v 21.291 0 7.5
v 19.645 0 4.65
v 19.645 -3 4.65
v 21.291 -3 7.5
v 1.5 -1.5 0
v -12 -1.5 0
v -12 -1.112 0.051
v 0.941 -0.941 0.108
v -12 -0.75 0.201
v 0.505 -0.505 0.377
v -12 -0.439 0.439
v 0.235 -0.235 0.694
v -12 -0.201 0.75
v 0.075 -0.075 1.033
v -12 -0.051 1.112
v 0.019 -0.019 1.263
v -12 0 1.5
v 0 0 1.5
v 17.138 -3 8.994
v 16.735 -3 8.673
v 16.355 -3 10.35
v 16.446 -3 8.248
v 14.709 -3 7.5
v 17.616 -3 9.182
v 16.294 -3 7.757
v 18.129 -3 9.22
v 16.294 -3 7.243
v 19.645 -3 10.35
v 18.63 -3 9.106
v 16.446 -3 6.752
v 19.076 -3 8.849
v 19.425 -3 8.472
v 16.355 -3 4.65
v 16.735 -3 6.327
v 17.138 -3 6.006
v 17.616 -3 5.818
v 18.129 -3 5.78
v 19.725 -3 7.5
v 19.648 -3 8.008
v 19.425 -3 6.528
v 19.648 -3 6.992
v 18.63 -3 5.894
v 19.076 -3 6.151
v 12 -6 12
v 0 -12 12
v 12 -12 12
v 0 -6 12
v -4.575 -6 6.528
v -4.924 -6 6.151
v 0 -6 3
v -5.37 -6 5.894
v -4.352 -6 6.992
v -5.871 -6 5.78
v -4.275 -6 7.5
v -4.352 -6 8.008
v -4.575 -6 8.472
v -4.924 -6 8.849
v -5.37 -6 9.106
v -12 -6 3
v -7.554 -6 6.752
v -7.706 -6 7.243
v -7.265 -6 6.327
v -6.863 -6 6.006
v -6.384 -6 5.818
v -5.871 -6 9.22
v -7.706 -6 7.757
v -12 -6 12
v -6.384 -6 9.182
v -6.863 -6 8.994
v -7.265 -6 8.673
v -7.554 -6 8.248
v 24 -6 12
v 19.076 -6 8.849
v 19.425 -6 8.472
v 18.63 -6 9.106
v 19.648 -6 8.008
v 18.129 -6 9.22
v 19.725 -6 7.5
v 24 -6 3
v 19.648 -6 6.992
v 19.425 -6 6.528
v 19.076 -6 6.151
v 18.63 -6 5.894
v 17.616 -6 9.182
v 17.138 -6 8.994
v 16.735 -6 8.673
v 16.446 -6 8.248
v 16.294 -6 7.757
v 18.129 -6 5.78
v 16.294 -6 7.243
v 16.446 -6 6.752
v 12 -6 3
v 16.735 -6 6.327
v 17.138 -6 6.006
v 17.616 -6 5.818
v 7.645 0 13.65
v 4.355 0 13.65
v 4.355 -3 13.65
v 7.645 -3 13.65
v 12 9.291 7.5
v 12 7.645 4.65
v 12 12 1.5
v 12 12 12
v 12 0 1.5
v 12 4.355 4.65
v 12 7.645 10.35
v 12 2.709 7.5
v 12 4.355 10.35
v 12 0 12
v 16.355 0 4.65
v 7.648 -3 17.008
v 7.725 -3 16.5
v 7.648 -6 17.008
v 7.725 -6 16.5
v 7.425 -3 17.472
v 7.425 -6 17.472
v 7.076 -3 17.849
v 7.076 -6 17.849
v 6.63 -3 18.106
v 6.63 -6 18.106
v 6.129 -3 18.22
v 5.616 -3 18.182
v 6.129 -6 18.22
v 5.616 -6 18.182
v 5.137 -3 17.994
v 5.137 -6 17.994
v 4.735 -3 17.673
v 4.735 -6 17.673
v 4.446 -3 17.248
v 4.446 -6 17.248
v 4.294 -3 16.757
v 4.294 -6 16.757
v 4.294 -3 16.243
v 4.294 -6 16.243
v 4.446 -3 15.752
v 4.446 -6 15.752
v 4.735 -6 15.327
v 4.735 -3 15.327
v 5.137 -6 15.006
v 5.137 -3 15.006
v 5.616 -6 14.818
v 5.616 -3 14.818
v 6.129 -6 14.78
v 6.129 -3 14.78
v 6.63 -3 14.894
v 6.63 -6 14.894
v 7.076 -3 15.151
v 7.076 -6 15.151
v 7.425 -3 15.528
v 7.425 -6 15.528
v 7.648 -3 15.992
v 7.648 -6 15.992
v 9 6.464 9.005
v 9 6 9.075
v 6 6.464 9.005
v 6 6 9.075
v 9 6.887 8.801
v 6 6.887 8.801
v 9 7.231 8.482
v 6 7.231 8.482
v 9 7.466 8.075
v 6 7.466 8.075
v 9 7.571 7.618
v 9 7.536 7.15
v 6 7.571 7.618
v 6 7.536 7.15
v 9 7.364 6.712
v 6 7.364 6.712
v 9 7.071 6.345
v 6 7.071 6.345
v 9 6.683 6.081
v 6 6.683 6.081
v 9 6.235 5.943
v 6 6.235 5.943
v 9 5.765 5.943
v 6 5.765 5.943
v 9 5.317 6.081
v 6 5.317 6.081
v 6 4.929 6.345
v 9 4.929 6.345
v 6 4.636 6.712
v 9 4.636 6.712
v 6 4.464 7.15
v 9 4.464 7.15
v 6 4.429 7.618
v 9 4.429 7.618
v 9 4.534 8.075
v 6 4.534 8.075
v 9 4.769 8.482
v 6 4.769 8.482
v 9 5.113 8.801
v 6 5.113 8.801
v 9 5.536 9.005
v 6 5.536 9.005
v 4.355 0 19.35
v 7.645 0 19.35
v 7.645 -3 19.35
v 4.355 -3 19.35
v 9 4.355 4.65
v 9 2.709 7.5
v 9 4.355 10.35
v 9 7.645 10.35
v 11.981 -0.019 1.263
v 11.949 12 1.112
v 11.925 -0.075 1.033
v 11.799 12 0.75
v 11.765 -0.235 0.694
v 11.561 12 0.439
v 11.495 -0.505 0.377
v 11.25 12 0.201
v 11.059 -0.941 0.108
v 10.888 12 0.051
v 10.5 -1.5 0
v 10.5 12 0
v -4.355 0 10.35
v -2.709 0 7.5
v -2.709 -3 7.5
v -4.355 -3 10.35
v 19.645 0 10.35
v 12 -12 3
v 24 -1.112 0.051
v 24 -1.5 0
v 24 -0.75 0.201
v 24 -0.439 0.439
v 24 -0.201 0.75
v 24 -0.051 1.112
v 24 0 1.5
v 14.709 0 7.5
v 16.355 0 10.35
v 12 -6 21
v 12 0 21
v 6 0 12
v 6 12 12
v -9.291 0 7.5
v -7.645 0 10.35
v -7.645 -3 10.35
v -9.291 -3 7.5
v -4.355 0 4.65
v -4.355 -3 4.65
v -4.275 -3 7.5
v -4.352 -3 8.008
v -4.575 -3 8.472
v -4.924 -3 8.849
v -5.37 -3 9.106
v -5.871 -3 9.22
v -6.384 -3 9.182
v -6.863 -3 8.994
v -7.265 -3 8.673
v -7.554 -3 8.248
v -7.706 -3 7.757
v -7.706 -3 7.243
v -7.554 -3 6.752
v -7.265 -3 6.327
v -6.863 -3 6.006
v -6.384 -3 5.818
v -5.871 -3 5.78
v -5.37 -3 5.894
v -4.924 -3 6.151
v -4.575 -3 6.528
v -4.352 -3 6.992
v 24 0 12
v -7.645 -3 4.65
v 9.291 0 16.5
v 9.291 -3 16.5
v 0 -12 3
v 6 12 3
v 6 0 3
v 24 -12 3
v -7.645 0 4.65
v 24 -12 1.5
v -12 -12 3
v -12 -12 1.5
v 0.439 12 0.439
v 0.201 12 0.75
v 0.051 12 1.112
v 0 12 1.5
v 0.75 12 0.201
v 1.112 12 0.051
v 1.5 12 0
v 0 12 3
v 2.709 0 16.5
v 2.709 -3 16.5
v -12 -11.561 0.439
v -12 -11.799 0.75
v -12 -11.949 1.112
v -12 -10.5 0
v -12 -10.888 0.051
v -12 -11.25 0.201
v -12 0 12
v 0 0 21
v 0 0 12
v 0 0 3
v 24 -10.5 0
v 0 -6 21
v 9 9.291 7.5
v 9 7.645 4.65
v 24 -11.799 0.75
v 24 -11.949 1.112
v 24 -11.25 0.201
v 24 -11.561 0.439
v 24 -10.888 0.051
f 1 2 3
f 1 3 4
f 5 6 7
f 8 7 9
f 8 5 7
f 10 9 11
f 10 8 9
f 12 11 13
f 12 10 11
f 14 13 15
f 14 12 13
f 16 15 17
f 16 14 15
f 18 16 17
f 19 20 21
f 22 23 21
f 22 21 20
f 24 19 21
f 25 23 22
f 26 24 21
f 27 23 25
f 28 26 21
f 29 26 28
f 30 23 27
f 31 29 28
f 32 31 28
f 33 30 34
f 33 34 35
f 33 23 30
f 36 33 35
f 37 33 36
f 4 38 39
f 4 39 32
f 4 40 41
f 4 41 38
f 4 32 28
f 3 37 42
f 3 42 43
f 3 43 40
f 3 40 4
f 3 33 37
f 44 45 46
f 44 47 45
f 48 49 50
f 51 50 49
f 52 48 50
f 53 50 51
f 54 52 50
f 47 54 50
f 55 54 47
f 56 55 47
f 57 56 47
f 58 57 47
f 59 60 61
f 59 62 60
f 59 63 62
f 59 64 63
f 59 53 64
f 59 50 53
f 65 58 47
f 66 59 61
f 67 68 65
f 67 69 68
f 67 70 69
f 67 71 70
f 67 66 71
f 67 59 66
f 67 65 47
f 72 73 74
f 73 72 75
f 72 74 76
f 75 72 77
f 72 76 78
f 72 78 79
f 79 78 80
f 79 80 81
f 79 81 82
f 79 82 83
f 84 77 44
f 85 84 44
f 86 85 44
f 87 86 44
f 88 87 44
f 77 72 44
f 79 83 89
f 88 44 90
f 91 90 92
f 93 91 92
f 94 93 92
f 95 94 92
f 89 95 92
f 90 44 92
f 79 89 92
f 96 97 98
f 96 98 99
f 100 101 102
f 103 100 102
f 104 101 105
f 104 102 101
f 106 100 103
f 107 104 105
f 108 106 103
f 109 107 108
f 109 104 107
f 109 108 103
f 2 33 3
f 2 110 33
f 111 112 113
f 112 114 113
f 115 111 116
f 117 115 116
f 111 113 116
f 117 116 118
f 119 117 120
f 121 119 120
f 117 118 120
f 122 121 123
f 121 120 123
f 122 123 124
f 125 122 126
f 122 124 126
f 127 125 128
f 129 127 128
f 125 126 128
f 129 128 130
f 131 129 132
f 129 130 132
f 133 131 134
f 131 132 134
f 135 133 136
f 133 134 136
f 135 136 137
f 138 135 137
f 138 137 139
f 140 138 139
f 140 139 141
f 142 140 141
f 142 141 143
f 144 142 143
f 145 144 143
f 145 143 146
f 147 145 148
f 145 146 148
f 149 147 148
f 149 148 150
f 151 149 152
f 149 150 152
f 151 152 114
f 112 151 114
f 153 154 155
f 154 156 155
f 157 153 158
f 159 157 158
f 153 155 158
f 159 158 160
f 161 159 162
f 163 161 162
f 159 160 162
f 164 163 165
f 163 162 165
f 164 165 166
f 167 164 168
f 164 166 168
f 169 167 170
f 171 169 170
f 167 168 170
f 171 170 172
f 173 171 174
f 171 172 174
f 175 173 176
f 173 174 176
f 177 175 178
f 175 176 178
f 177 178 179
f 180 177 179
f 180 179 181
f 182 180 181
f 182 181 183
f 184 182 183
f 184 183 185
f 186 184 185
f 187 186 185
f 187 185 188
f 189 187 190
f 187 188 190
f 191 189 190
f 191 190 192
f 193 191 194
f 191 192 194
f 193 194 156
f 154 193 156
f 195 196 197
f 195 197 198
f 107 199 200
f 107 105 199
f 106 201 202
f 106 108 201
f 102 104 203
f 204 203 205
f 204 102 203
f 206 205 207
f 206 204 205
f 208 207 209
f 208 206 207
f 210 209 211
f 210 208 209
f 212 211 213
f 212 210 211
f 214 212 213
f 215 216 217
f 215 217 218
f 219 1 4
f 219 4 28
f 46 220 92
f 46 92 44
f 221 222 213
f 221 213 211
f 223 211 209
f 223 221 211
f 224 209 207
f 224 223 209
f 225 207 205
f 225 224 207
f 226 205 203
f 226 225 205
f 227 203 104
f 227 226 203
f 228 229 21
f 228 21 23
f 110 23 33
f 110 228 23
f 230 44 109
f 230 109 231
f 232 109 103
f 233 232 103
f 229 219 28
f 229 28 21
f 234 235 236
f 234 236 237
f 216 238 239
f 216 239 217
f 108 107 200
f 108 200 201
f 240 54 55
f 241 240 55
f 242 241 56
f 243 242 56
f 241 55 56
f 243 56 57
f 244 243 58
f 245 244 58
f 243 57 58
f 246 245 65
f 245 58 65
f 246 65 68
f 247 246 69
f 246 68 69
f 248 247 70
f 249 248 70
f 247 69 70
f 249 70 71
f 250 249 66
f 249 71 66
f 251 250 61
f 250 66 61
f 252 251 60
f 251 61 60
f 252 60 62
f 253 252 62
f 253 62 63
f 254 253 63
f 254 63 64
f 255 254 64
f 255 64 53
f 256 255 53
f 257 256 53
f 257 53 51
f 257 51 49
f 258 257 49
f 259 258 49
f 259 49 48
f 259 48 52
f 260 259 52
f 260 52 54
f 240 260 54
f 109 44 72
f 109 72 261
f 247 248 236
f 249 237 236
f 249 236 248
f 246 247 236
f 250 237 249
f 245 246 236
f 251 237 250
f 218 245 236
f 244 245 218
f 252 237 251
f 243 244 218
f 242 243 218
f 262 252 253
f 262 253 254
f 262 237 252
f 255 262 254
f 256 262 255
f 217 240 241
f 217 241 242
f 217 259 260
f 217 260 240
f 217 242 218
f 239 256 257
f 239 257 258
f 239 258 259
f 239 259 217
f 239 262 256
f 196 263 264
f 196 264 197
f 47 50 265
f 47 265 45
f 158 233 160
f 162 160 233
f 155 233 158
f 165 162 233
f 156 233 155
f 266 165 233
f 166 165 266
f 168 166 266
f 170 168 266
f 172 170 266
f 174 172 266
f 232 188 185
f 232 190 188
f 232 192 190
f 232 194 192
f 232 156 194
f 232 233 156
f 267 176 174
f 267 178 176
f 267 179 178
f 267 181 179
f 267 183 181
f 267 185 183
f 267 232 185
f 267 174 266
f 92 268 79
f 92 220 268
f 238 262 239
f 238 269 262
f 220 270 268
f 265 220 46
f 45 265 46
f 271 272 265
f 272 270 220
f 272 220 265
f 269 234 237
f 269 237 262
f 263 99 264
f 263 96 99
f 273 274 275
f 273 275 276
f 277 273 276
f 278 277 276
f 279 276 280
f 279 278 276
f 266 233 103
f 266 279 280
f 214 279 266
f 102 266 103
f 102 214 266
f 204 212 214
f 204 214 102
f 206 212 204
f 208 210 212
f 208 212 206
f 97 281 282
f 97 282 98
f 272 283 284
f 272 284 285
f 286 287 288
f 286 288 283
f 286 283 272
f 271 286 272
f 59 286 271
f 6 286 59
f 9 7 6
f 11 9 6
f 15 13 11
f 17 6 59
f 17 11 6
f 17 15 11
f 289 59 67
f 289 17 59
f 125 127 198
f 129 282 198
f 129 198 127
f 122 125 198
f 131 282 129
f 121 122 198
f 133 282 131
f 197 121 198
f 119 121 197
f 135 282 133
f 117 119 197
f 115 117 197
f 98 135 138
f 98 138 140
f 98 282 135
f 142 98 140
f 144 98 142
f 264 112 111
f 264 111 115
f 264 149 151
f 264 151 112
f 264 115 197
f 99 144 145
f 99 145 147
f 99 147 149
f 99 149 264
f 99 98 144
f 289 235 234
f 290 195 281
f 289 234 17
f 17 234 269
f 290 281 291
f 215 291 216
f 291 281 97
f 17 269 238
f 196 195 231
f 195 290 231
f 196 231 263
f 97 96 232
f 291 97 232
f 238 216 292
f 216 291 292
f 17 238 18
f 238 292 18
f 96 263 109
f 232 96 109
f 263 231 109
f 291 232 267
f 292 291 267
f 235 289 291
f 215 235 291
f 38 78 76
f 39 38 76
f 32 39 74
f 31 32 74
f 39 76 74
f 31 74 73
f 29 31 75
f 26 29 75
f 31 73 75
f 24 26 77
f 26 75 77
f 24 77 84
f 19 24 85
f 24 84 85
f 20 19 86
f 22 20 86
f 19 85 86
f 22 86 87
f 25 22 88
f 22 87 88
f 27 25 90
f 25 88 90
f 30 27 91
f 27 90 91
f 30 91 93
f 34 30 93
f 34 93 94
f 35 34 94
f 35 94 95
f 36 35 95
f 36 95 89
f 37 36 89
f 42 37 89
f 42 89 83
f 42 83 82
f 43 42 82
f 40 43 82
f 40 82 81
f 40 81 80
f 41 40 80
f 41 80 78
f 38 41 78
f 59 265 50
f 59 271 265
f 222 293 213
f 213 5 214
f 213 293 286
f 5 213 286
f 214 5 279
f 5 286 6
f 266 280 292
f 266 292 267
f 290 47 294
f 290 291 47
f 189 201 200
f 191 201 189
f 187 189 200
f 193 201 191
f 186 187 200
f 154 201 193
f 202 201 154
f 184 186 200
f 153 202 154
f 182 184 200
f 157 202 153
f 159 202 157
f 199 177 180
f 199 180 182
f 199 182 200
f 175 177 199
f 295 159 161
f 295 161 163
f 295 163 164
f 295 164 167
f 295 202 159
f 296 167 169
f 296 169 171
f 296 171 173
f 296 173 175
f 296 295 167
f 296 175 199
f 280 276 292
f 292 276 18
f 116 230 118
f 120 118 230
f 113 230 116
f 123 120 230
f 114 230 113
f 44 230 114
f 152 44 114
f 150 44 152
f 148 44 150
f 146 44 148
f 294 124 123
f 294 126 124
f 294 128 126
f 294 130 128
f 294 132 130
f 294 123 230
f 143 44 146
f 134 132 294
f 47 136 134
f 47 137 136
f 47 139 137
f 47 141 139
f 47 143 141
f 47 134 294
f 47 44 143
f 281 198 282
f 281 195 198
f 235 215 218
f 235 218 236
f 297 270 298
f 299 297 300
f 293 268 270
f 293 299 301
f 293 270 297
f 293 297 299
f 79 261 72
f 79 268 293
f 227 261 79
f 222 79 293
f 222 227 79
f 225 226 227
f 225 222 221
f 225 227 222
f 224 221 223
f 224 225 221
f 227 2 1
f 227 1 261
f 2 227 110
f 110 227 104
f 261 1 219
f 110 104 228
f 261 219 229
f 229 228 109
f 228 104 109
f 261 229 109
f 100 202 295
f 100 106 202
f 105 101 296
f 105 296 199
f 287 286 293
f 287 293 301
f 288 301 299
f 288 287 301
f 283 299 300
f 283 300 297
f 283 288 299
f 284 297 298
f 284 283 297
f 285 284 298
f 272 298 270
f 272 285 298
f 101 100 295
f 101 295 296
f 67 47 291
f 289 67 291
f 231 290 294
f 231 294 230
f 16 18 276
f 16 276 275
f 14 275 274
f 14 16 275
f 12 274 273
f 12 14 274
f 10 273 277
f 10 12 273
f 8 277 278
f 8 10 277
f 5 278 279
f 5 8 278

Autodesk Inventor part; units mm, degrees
ref_plane "YZ Plane" through (0, 0, 0) normal (1, 0, 0) x (0, 1, 0)
ref_plane "XZ Plane" through (0, 0, 0) normal (0, 1, 0) x (-1, 0, 0)
ref_plane "XY Plane" through (0, 0, 0) normal (0, 0, 1) x (1, 0, 0)
sketch "Sketch1" plane through (0, 0, 0) normal (0, 0, 1) x (1, 0, 0)
  line L0 (0, 0) -> (12, 0)
  line L1 (12, 0) -> (12, 12)
  line L2 (12, 12) -> (0, 12)
  line L3 (0, 12) -> (0, 0)
  line L4 (12, 0) -> (0, 0)
  line L5 (0, 0) -> (0, -12)
  line L6 (0, -12) -> (12, -12)
  line L7 (12, -12) -> (12, 0)
  line L8 (12, 0) -> (24, 0)
  line L9 (24, 0) -> (24, -12)
  line L10 (24, -12) -> (12, -12)
  line L11 (12, -12) -> (12, 0)
  line L12 (0, -12) -> (-12, -12)
  line L13 (-12, -12) -> (-12, 0)
  line L14 (-12, 0) -> (0, 0)
  line L15 (0, 0) -> (0, -12)
  line L16 (0, -12) -> (12, -12)
  line L17 (12, -12) -> (12, -24)
  line L18 (12, -24) -> (0, -24)
  line L19 (0, -24) -> (0, -12)
  dimension "d0" = 12
  dimension "d1" = 12
  dimension "d2" = 12
  dimension "d3" = 12
  dimension "d4" = 12
  dimension "d5" = 12
  dimension "d6" = 12
  dimension "d7" = 12
  dimension "d8" = 12
  dimension "d9" = 12
extrude "Extrusion1" add sketch "Sketch1" along normal blind 3
sketch "Sketch2" plane through (0, 0, 3) normal (0, 0, 1) x (1, 0, 0)
  line L0 (-12, 0) -> (-12, -12) projected
  line L1 (-12, -12) -> (-12, -6)
  line L2 (-12, -6) -> (0, -6)
  line L3 (-12, -12) -> (0, -12) projected
  line L4 (0, -6) -> (0, -12)
  line L5 (0, -12) -> (-12, -12)
  line L6 (12, -24) -> (12, -12) projected
  line L7 (12, -12) -> (12, -6)
  line L8 (12, -6) -> (24, -6)
  line L9 (24, -12) -> (24, 0) projected
  line L10 (12, -12) -> (24, -12) projected
  line L11 (24, -6) -> (24, -12)
  line L12 (24, -12) -> (12, -12)
  line L13 (0, 0) -> (0, -6)
  line L14 (12, 0) -> (12, 12) projected
  line L15 (0, 0) -> (12, 0)
  line L16 (12, 0) -> (12, -6)
  line L17 (12, -12) -> (0, -12)
  line L18 (0, 12) -> (0, 0) projected
  line L19 (0, 0) -> (0, 12)
  line L20 (0, 12) -> (6, 12)
  line L21 (12, 12) -> (0, 12) projected
  line L22 (6, 12) -> (6, 0)
  line L23 (6, 0) -> (0, 0)
  line L24 (0, -12) -> (0, -24) projected
  line L25 (0, -12) -> (0, -24)
  line L26 (0, -24) -> (6, -24)
  line L27 (0, -24) -> (12, -24) projected
  line L28 (6, -24) -> (6, -12)
  line L29 (6, -12) -> (0, -12)
  dimension "d12" = 6
  dimension "d13" = 12
extrude "Extrusion2" add sketch "Sketch2" along normal blind 9 contours L2 L4 L3 L0 | L13 L15 L16 L7 L17 L4 | L17 L28 L26 L24 | L18 L20 L22 L15 | L7 L8 L9 L10
sketch "Sketch3" plane through (0, 0, 12) normal (0, 0, 1) x (1, 0, 0)
  line L0 (0, -6) -> (12, -6)
  line L1 (12, -12) -> (6, -12) projected
  line L2 (12, -6) -> (12, -12)
  line L3 (0, -12) -> (0, -24) projected
  line L4 (12, -12) -> (0, -12)
  line L5 (0, -12) -> (0, -6)
  point P0 (0, 0)
extrude "Extrusion3" add sketch "Sketch3" along normal blind 9
sketch "Sketch4" plane through (6, -12, 3) normal (0, -1, 0) x (1, 0, 0)
  point P0 (-6, -3)
sketch "Sketch5" plane through (-12, -6, 3) normal (0, 1, 0) x (1, 0, 0)
  circle A0 centre (6, -4.5) radius 1.725
  line L0 (0, 0) -> (0, -9) projected
  line L1 (12, -9) -> (0, -9) projected
  circle A1 centre (18, -13.5) radius 1.725
  line L2 (24, -18) -> (12, -18) projected
  line L3 (24, -9) -> (24, -18) projected
  circle A2 centre (30, -4.5) radius 1.725
  line L4 (36, 0) -> (36, -9) projected
  line L5 (36, -9) -> (24, -9) projected
  point P0 (12, 3)
  dimension "d19" = 3.45
  dimension "d20" = 6
  dimension "d21" = 4.5
  dimension "d22" = 3.45
  dimension "d23" = 4.5
  dimension "d24" = 6
  dimension "d25" = 3.45
  dimension "d26" = 6
  dimension "d27" = 4.5
extrude "Extrusion4" cut sketch "Sketch5" against normal blind 3
sketch "Sketch6" plane through (6, -12, 3) normal (0, -1, 0) x (1, 0, 0)
  circle A0 centre (-12, 4.5) radius 1.725 projected
  line L0 (-10.3546, 7.35) -> (-8.7091, 4.5)
  line L1 (-8.7091, 4.5) -> (-10.3546, 1.65)
  line L2 (-10.3546, 1.65) -> (-13.6454, 1.65)
  line L3 (-13.6454, 1.65) -> (-15.2909, 4.5)
  line L4 (-15.2909, 4.5) -> (-13.6454, 7.35)
  line L5 (-13.6454, 7.35) -> (-10.3546, 7.35)
  circle A1 centre (12, 4.5) radius 1.725 projected
  line L6 (13.6454, 7.35) -> (15.2909, 4.5)
  line L7 (15.2909, 4.5) -> (13.6454, 1.65)
  line L8 (13.6454, 1.65) -> (10.3546, 1.65)
  line L9 (10.3546, 1.65) -> (8.7091, 4.5)
  line L10 (8.7091, 4.5) -> (10.3546, 7.35)
  line L11 (10.3546, 7.35) -> (13.6454, 7.35)
  circle A2 centre (0, 13.5) radius 1.725 projected
  line L12 (1.6454, 16.35) -> (3.2909, 13.5)
  line L13 (3.2909, 13.5) -> (1.6454, 10.65)
  line L14 (1.6454, 10.65) -> (-1.6454, 10.65)
  line L15 (-1.6454, 10.65) -> (-3.2909, 13.5)
  line L16 (-3.2909, 13.5) -> (-1.6454, 16.35)
  line L17 (-1.6454, 16.35) -> (1.6454, 16.35)
  point P0 (-6, -3)
  dimension "d30" = 2.85
  dimension "d31" = 2.85
  dimension "d32" = 2.85
extrude "Extrusion5" cut sketch "Sketch6" against normal blind 3 contours A0 | L0 L1 L2 L3 L4 L5 | A1 | L6 L7 L8 L9 L10 L11 | A2 | L12 L13 L14 L15 L16 L17
sketch "Sketch7" plane through (6, 0, 3) normal (1, 0, 0) x (0, 0, -1)
  circle A0 centre (-4.5, 6) radius 1.725
  circle A1 centre (-4.5, -18) radius 1.725
  line L0 (-9, 0) -> (-9, 12) projected
  line L1 (-9, -24) -> (-9, -12) projected
  line L2 (0, -24) -> (-9, -24) projected
  line L3 (0, 12) -> (-9, 12) projected
  point P0 (3, 0)
  dimension "d35" = 3.45
  dimension "d36" = 3.45
  dimension "d37" = 4.5
  dimension "d38" = 4.5
  dimension "d39" = 6
  dimension "d40" = 6
extrude "Extrusion6" cut sketch "Sketch7" against normal blind 3
sketch "Sketch8" plane through (0, -6, 3) normal (-1, 0, 0) x (0, 0, 1)
  circle A0 centre (4.5, 12) radius 1.725 projected
  line L0 (1.65, 13.6454) -> (4.5, 15.2909)
  line L1 (4.5, 15.2909) -> (7.35, 13.6454)
  line L2 (7.35, 13.6454) -> (7.35, 10.3546)
  line L3 (7.35, 10.3546) -> (4.5, 8.7091)
  line L4 (4.5, 8.7091) -> (1.65, 10.3546)
  line L5 (1.65, 10.3546) -> (1.65, 13.6454)
  circle A1 centre (4.5, -12) radius 1.725 projected
  line L6 (1.65, -10.3546) -> (4.5, -8.7091)
  line L7 (4.5, -8.7091) -> (7.35, -10.3546)
  line L8 (7.35, -10.3546) -> (7.35, -13.6454)
  line L9 (7.35, -13.6454) -> (4.5, -15.2909)
  line L10 (4.5, -15.2909) -> (1.65, -13.6454)
  line L11 (1.65, -13.6454) -> (1.65, -10.3546)
  point P0 (-3, 6)
  dimension "d43" = 2.85
  dimension "d44" = 2.85
extrude "Extrusion7" cut sketch "Sketch8" against normal blind 3 contours A0 | L0 L1 L2 L3 L4 L5 | A1 | L6 L7 L8 L9 L10 L11
sketch "Sketch9" plane through (0, 0, 0) normal (0, 0, -1) x (-1, 0, 0)
  line L0 (-24, -12) -> (-24, 0) projected
  line L1 (-12, -12) -> (-12, -6) projected
  line L2 (-24, 0) -> (-12, 0)
  line L3 (-12, 0) -> (-12, -12)
  line L4 (-12, -12) -> (-24, -12)
  line L5 (-24, -12) -> (-24, 0)
  line L6 (-12, -12) -> (0, -12)
  line L7 (0, -12) -> (0, -24)
  line L8 (0, -24) -> (-12, -24)
  line L9 (-12, -24) -> (-12, -12)
  point P0 (0, 0)
extrude "Extrusion8" cut sketch "Sketch9" against normal through all
sketch "Sketch10" plane through (0, 12, 12) normal (0, 1, 0) x (1, 0, 0)
  line L0 (6, 0) -> (0, 0) projected
  line L1 (12, 9) -> (6, 9) projected
  line L2 (0, 0) -> (6, 0)
  line L3 (6, 0) -> (6, 9)
  line L4 (6, 9) -> (0, 9)
  line L5 (0, 9) -> (0, 0)
  point P0 (0, 12)
extrude "Extrusion9" cut sketch "Sketch10" against normal blind 12
sketch "Sketch11" plane through (0, 0, 3) normal (0, 1, 0) x (1, 0, 0)
  line L0 (12, 0) -> (12, -9) projected
  line L1 (12, 0) -> (0, 0) projected
  line L2 (12, -9) -> (6, -9)
  line L3 (6, -9) -> (6, 0)
  line L4 (6, 0) -> (12, 0)
  line L5 (12, 0) -> (12, -9)
  point P0 (0, 3)
extrude "Extrusion10" add sketch "Sketch11" along normal blind 12
sketch "Sketch12" plane through (6, 0, 3) normal (-1, 0, 0) x (0, 0, 1)
  circle A0 centre (4.5, 6) radius 1.575
  line L0 (9, 0) -> (9, 12) projected
  line L1 (0, 12) -> (9, 12) projected
  point P0 (-3, 0)
  dimension "d54" = 3.15
  dimension "d55" = 4.5
  dimension "d56" = 6
extrude "Extrusion11" cut sketch "Sketch12" against normal blind 3
sketch "Sketch13" plane through (12, -6, 12) normal (1, 0, 0) x (0, 0, -1)
  circle A0 centre (4.5, 12) radius 1.575 projected
  line L0 (1.65, 13.6454) -> (4.5, 15.2909)
  line L1 (4.5, 15.2909) -> (7.35, 13.6454)
  line L2 (7.35, 13.6454) -> (7.35, 10.3546)
  line L3 (7.35, 10.3546) -> (4.5, 8.7091)
  line L4 (4.5, 8.7091) -> (1.65, 10.3546)
  line L5 (1.65, 10.3546) -> (1.65, 13.6454)
  point P0 (12, 6)
  dimension "d59" = 5.7
extrude "Extrusion12" cut sketch "Sketch13" against normal blind 3 contours A0 | L0 L1 L2 L3 L4 L5
sketch "Sketch14" plane through (0, -6, 3) normal (-1, 0, 0) x (0, 0, 1)
  line L0 (9, 6) -> (0, 6) projected
  line L1 (0, 6) -> (0, 0) projected
  line L2 (9, 6) -> (0, 6)
  line L3 (0, 6) -> (0, 0)
  line L4 (0, 0) -> (9, 0)
  line L5 (9, 0) -> (9, 6)
  point P0 (-3, 6)
extrude "Extrusion13" add sketch "Sketch14" along normal blind 12
sketch "Sketch15" plane through (-12, -12, 0) normal (-1, 0, 0) x (0, 0, 1)
  line L0 (12, 0) -> (12, 6) projected
  line L1 (12, 0) -> (3, 0)
  line L2 (3, 0) -> (3, 6)
  line L3 (3, 6) -> (12, 6)
  line L4 (12, 6) -> (12, 0)
  point P0 (0, 12)
  dimension "d64" = 9
  dimension "d65" = 6
extrude "Extrusion14" cut sketch "Sketch15" against normal blind 12
sketch "Sketch16" plane through (-12, -6, 12) normal (0, -1, 0) x (1, 0, 0)
  circle A0 centre (6, -4.5) radius 1.725
  line L0 (0, -9) -> (0, 0) projected
  line L1 (0, 0) -> (12, 0) projected
  point P0 (12, -12)
  dimension "d68" = 3.45
  dimension "d69" = 6
  dimension "d70" = 4.5
extrude "Extrusion15" cut sketch "Sketch16" against normal blind 3
sketch "Sketch17" plane through (-12, 0, 0) normal (0, 1, 0) x (1, 0, 0)
  circle A0 centre (6, -7.5) radius 1.725 projected
  line L0 (4.3546, -10.35) -> (2.7091, -7.5)
  line L1 (2.7091, -7.5) -> (4.3546, -4.65)
  line L2 (4.3546, -4.65) -> (7.6454, -4.65)
  line L3 (7.6454, -4.65) -> (9.2909, -7.5)
  line L4 (9.2909, -7.5) -> (7.6454, -10.35)
  line L5 (7.6454, -10.35) -> (4.3546, -10.35)
  point P0 (12, 0)
  dimension "d73" = 5.7
extrude "Extrusion16" cut sketch "Sketch17" against normal blind 3 contours A0 | L0 L1 L2 L3 L4 L5
sketch "Sketch18" plane through (0, 0, 12) normal (0, 0, 1) x (1, 0, 0)
  line L0 (12, -6) -> (12, 12) projected
  line L1 (0, 0) -> (12, 0)
  line L2 (12, 0) -> (12, -6)
  line L3 (12, -6) -> (0, -6)
  line L4 (0, -6) -> (0, 0)
extrude "Extrusion17" add sketch "Sketch18" along normal blind 9
sketch "Sketch19" plane through (0, 0, 21) normal (0, 0, 1) x (1, 0, 0)
  line L0 (0, -12) -> (12, -12) projected
  line L1 (12, -12) -> (12, 0) projected
  line L2 (0, -12) -> (12, -12)
  line L3 (12, -12) -> (12, -6)
  line L4 (12, -6) -> (0, -6)
  line L5 (0, -6) -> (0, -12)
  point P0 (0, 0)
extrude "Extrusion18" cut sketch "Sketch19" against normal blind 9
sketch "Sketch20" plane through (0, -6, 21) normal (0, -1, 0) x (1, 0, 0)
  circle A0 centre (6, -4.5) radius 1.725
  line L0 (0, 0) -> (12, 0) projected
  line L1 (0, -9) -> (0, 0) projected
  point P0 (0, -21)
  dimension "d80" = 3.45
  dimension "d81" = 4.5
  dimension "d82" = 6
extrude "Extrusion19" cut sketch "Sketch20" against normal blind 3
sketch "Sketch21" plane through (-12, 0, 0) normal (0, 1, 0) x (1, 0, 0)
  circle A0 centre (18, -16.5) radius 1.725 projected
  line L0 (16.3546, -19.35) -> (14.7091, -16.5)
  line L1 (14.7091, -16.5) -> (16.3546, -13.65)
  line L2 (16.3546, -13.65) -> (19.6454, -13.65)
  line L3 (19.6454, -13.65) -> (21.2909, -16.5)
  line L4 (21.2909, -16.5) -> (19.6454, -19.35)
  line L5 (19.6454, -19.35) -> (16.3546, -19.35)
  point P0 (12, 0)
  dimension "d85" = 5.7
extrude "Extrusion20" cut sketch "Sketch21" against normal blind 3 contours A0 | L0 L1 L2 L3 L4 L5
sketch "Sketch22" plane through (12, -12, 0) normal (1, 0, 0) x (0, 0, -1)
  line L0 (-12, 6) -> (-12, 12) projected
  line L1 (0, 24) -> (0, 12) projected
  line L2 (-12, 6) -> (-3, 6)
  line L3 (0, 0) -> (0, 12)
  line L4 (0, 12) -> (-12, 12)
  line L5 (-12, 12) -> (-12, 6)
  line L6 (0, 0) -> (-12, 0) projected
  line L7 (-3, 6) -> (-12, 6) projected
  line L8 (0, 0) -> (-3, 0)
  line L9 (-3, 0) -> (-3, 6)
  line L10 (0, 12) -> (0, 0)
extrude "Extrusion21" add sketch "Sketch22" along normal blind 12
sketch "Sketch23" plane through (12, -6, 3) normal (0, -1, 0) x (1, 0, 0)
  circle A0 centre (6, 4.5) radius 1.725
  line L0 (0, 9) -> (12, 9) projected
  line L1 (12, 9) -> (12, 0) projected
  point P0 (-12, -3)
  dimension "d91" = 3.45
  dimension "d92" = 4.5
  dimension "d93" = 6
extrude "Extrusion22" cut sketch "Sketch23" against normal blind 3
sketch "Sketch24" plane through (12, 0, 12) normal (0, 1, 0) x (1, 0, 0)
  circle A0 centre (6, 4.5) radius 1.725 projected
  line L0 (4.3546, 1.65) -> (2.7091, 4.5)
  line L1 (2.7091, 4.5) -> (4.3546, 7.35)
  line L2 (4.3546, 7.35) -> (7.6454, 7.35)
  line L3 (7.6454, 7.35) -> (9.2909, 4.5)
  line L4 (9.2909, 4.5) -> (7.6454, 1.65)
  line L5 (7.6454, 1.65) -> (4.3546, 1.65)
  point P0 (-12, 12)
  dimension "d96" = 5.7
extrude "Extrusion23" cut sketch "Sketch24" against normal blind 3 contours A0 | L0 L1 L2 L3 L4 L5
fillet "Fillet4" radius 1.5 5 edges at (6, -12, 0) (-6, 0, 0) (0, 6, 0) (12, 6, 0) (18, 0, 0)
properties part number "topthreewayESW"
